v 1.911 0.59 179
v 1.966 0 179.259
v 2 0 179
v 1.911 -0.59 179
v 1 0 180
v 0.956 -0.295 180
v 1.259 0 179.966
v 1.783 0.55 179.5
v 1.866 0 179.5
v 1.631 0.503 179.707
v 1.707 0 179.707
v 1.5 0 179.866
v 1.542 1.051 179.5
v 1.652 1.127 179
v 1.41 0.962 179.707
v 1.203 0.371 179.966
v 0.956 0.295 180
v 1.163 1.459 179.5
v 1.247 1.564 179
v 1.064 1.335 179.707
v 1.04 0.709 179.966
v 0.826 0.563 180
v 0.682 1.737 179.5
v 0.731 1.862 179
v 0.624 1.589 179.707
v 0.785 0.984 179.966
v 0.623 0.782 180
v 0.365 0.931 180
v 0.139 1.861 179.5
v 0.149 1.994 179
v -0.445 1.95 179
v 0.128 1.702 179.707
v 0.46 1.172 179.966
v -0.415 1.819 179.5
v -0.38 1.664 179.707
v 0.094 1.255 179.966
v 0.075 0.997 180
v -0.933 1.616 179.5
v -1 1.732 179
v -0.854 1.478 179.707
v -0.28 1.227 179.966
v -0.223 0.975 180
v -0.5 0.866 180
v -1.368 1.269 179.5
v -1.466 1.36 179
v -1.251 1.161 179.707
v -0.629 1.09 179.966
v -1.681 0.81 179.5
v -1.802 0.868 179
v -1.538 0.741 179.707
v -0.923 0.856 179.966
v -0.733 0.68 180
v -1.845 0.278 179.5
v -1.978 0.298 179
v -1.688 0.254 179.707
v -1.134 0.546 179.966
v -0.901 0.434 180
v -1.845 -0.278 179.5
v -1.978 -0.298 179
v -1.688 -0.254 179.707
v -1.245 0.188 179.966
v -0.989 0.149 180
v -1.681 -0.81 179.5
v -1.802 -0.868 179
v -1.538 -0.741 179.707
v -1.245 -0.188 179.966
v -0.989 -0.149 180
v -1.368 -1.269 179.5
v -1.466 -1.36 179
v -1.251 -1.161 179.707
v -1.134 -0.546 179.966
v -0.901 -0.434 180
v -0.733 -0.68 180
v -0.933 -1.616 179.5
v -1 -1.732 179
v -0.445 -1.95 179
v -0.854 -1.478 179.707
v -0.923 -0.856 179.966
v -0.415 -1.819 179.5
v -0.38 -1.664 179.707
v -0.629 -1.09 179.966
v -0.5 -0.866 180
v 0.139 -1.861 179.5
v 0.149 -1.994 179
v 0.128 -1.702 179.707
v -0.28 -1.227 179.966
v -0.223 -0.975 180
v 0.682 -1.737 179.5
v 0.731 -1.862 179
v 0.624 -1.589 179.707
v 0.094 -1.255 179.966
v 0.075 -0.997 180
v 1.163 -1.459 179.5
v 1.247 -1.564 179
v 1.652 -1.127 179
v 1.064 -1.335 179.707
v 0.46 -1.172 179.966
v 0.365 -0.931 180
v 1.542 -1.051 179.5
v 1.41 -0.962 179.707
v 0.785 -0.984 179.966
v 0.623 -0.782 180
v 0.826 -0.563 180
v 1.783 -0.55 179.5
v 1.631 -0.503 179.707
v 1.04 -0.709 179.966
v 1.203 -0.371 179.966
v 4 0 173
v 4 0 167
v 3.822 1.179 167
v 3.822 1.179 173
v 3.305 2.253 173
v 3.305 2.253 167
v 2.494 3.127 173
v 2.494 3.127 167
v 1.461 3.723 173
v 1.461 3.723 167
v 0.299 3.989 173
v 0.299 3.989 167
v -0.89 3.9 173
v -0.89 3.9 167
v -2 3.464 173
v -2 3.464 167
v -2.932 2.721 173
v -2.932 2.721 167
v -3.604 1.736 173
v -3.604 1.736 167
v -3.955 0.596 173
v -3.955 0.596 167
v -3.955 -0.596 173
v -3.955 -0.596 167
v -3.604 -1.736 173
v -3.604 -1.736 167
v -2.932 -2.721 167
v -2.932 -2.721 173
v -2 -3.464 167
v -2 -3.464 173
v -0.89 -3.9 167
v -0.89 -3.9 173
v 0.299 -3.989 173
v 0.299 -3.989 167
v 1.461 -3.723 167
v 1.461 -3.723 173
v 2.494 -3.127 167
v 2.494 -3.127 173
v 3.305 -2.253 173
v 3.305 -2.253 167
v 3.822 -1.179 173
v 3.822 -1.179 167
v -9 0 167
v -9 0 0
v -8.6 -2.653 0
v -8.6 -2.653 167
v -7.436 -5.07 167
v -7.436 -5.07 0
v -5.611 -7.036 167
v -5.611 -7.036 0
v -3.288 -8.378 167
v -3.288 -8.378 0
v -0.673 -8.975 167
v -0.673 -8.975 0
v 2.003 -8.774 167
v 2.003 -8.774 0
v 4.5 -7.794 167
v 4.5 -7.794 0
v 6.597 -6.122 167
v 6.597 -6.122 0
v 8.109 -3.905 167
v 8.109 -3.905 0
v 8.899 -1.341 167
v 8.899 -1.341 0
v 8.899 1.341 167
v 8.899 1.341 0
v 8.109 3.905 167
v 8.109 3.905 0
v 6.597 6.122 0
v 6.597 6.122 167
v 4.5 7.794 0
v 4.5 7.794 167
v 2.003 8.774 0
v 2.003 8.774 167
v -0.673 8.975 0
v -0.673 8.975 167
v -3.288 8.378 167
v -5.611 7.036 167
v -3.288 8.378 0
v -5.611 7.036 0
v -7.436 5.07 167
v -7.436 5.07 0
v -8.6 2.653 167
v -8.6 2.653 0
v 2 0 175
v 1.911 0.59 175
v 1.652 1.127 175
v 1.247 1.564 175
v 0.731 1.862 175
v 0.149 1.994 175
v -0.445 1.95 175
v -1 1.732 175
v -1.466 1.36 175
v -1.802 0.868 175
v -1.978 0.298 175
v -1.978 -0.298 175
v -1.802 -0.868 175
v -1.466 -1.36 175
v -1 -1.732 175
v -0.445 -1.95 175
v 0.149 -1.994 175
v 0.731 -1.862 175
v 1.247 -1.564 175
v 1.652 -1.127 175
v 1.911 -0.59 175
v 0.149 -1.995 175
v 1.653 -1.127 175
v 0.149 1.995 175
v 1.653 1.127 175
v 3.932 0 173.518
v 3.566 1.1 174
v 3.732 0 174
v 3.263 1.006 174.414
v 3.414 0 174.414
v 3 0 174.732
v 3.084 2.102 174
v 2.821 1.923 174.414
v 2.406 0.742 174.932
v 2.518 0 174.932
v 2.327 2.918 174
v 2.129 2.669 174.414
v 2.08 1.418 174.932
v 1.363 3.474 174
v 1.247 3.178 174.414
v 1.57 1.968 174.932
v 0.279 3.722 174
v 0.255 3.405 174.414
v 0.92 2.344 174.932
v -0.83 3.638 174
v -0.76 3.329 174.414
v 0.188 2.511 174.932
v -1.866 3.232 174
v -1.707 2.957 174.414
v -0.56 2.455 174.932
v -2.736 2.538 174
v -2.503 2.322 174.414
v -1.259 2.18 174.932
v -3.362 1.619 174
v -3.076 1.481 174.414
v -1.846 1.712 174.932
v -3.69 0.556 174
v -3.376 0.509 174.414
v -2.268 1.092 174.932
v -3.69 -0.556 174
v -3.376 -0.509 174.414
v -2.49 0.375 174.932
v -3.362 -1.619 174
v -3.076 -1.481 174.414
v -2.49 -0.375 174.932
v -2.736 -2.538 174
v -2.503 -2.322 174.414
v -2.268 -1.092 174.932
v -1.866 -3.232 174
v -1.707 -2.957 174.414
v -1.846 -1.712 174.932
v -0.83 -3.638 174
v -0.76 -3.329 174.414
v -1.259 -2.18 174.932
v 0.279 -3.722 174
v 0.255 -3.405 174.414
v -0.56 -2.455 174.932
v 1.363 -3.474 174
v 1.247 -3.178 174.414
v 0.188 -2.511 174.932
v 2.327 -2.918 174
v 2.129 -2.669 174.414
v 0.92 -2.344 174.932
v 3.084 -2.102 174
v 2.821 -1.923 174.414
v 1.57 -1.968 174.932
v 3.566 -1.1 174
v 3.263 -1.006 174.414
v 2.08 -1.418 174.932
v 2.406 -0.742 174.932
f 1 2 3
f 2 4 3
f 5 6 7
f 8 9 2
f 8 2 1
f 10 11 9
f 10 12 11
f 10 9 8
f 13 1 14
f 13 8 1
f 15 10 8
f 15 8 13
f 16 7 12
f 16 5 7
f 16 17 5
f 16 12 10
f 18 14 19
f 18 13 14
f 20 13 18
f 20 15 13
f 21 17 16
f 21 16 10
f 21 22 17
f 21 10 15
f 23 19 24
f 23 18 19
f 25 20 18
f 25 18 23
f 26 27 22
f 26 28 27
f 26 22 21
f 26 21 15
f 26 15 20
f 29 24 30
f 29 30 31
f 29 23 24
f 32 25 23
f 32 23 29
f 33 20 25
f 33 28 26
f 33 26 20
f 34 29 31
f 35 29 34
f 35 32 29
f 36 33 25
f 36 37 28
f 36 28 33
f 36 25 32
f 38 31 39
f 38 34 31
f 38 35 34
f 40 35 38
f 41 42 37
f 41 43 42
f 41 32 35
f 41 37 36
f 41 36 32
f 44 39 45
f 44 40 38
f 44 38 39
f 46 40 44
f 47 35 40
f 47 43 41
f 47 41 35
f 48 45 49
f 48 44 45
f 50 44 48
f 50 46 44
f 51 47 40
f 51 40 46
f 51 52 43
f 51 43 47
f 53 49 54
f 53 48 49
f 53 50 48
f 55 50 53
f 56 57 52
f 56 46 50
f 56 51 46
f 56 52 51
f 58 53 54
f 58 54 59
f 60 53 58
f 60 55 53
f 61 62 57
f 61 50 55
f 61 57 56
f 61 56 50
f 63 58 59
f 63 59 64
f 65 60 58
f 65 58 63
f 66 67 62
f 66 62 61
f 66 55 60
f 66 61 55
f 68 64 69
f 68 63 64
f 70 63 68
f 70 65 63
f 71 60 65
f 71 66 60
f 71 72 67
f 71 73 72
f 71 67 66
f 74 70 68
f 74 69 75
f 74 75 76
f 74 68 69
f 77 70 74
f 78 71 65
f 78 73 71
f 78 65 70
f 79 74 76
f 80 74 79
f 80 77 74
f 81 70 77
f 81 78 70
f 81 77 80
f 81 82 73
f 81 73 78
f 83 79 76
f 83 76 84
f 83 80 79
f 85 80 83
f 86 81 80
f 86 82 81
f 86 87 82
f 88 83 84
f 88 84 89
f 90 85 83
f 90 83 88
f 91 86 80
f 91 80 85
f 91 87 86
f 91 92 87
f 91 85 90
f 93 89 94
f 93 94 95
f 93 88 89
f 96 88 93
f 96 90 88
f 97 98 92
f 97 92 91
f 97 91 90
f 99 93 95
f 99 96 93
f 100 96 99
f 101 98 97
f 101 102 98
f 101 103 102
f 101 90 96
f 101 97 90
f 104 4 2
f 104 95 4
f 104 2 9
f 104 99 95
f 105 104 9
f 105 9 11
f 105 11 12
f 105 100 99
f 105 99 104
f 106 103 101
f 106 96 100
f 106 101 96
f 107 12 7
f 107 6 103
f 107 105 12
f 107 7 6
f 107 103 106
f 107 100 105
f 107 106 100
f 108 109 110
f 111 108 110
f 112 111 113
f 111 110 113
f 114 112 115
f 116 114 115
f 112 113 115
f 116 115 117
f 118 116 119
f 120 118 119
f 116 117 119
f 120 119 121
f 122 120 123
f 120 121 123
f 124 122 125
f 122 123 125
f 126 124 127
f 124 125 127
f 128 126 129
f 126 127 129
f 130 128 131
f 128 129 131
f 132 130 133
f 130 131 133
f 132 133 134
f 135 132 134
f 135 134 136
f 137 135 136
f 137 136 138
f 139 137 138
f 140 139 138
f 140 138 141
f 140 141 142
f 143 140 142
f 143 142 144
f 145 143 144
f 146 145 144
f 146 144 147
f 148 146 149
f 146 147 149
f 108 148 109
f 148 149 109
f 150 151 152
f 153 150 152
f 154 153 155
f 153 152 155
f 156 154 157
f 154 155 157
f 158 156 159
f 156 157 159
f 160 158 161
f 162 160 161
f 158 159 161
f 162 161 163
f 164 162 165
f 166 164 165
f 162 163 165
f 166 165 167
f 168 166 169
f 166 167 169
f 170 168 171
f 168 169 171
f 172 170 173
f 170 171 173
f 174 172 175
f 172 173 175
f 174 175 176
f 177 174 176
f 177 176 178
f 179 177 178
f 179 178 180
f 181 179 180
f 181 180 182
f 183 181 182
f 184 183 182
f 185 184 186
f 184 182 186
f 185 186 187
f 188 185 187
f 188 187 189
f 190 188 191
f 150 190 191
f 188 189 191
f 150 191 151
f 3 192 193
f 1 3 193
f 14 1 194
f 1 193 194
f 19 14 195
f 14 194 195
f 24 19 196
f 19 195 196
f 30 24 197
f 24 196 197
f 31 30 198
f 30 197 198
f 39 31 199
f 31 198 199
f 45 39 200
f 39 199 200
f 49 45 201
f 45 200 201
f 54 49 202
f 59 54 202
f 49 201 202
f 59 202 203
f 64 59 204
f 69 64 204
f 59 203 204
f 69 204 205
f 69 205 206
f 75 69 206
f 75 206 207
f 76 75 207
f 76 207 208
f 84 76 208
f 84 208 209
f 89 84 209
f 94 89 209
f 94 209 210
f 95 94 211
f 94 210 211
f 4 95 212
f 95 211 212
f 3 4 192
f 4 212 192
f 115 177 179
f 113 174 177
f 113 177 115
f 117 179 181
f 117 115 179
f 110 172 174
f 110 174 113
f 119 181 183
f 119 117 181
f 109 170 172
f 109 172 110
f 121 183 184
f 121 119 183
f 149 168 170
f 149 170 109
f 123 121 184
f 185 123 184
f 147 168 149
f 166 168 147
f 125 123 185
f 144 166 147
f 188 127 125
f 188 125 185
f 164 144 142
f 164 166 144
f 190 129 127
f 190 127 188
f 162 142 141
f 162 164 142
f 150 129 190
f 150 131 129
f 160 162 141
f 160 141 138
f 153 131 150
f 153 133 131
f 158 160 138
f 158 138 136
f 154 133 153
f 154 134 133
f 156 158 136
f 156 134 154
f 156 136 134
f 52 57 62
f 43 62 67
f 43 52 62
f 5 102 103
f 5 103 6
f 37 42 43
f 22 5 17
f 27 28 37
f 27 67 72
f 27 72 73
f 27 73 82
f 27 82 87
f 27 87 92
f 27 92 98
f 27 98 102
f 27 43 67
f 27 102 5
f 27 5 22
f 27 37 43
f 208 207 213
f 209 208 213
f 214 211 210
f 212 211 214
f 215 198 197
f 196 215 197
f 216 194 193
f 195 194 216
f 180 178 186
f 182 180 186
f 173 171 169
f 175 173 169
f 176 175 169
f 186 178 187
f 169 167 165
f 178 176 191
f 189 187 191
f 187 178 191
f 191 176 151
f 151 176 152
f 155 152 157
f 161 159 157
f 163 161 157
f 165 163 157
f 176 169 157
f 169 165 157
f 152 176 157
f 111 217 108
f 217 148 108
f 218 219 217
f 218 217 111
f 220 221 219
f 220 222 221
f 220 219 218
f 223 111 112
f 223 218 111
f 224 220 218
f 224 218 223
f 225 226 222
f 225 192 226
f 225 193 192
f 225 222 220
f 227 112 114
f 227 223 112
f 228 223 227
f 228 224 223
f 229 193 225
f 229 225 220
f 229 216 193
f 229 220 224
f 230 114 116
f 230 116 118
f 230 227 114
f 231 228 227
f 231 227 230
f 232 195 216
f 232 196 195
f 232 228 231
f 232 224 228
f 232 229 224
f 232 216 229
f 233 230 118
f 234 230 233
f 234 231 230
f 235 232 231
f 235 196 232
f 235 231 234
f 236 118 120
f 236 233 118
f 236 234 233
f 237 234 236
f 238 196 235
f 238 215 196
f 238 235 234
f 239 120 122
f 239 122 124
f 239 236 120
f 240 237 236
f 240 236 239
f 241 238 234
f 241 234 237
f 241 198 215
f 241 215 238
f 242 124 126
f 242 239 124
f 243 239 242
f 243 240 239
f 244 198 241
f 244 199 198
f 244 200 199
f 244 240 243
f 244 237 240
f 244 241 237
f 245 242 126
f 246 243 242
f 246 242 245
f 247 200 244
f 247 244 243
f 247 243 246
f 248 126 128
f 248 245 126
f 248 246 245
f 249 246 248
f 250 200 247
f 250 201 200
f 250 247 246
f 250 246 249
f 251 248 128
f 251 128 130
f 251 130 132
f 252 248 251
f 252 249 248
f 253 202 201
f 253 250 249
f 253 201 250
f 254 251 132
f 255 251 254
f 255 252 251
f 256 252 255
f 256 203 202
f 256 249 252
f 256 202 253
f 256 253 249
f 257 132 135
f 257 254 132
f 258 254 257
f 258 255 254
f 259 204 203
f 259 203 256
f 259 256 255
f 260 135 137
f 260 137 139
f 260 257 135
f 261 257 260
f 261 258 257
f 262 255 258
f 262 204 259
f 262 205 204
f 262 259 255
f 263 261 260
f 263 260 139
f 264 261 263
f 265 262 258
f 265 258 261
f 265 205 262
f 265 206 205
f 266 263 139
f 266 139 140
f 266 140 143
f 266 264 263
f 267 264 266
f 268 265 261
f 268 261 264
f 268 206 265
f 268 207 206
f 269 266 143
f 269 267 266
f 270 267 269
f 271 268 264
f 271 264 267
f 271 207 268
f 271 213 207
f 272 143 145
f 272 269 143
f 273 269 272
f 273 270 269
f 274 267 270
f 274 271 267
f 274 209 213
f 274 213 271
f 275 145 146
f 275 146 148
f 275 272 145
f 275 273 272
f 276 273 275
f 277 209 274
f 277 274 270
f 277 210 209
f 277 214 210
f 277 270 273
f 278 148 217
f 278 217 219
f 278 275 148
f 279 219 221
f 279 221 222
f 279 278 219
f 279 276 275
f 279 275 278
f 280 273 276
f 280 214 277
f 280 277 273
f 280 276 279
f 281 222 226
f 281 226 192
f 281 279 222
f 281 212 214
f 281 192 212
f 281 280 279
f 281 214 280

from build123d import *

# Parameters (mm, degrees)
SKETCH_1_R      = 9
EXTRUDE_1_DEPTH = 167
SKETCH_2_R      = 4
EXTRUDE_2_DEPTH = 8
SKETCH_3_R      = 2
EXTRUDE_3_DEPTH = 5
FILLET_1_R      = 2
FILLET_2_R      = 1


with BuildPart() as part:
    # Эскиз1 → Бобышка-Вытянуть1 (new body)
    with BuildSketch(Plane.XY):
        with Locations(Location((0, 0, 0), (0, 0, 180))):
            Circle(SKETCH_1_R)
    extrude(amount=EXTRUDE_1_DEPTH)

    # Эскиз2 → Бобышка-Вытянуть2 (add)
    with BuildSketch(Plane.XY.offset(167)):
        Circle(SKETCH_2_R)
    extrude(amount=EXTRUDE_2_DEPTH)

    # Эскиз3 → Бобышка-Вытянуть3 (add)
    with BuildSketch(Plane.XY.offset(175)):
        Circle(SKETCH_3_R)
    extrude(amount=EXTRUDE_3_DEPTH)

    # Скругление1
    fillet_1_edges = [part.edges().sort_by_distance(p)[0] for p in [
        (-4, 0, 175),
    ]]
    fillet(fillet_1_edges, radius=FILLET_1_R - 0.0001)  # a hair under: the kernel refuses the full size

    # Скругление2
    fillet_2_edges = [part.edges().sort_by_distance(p)[0] for p in [
        (-2, 0, 180),
    ]]
    fillet(fillet_2_edges, radius=FILLET_2_R)


solid = part.part
